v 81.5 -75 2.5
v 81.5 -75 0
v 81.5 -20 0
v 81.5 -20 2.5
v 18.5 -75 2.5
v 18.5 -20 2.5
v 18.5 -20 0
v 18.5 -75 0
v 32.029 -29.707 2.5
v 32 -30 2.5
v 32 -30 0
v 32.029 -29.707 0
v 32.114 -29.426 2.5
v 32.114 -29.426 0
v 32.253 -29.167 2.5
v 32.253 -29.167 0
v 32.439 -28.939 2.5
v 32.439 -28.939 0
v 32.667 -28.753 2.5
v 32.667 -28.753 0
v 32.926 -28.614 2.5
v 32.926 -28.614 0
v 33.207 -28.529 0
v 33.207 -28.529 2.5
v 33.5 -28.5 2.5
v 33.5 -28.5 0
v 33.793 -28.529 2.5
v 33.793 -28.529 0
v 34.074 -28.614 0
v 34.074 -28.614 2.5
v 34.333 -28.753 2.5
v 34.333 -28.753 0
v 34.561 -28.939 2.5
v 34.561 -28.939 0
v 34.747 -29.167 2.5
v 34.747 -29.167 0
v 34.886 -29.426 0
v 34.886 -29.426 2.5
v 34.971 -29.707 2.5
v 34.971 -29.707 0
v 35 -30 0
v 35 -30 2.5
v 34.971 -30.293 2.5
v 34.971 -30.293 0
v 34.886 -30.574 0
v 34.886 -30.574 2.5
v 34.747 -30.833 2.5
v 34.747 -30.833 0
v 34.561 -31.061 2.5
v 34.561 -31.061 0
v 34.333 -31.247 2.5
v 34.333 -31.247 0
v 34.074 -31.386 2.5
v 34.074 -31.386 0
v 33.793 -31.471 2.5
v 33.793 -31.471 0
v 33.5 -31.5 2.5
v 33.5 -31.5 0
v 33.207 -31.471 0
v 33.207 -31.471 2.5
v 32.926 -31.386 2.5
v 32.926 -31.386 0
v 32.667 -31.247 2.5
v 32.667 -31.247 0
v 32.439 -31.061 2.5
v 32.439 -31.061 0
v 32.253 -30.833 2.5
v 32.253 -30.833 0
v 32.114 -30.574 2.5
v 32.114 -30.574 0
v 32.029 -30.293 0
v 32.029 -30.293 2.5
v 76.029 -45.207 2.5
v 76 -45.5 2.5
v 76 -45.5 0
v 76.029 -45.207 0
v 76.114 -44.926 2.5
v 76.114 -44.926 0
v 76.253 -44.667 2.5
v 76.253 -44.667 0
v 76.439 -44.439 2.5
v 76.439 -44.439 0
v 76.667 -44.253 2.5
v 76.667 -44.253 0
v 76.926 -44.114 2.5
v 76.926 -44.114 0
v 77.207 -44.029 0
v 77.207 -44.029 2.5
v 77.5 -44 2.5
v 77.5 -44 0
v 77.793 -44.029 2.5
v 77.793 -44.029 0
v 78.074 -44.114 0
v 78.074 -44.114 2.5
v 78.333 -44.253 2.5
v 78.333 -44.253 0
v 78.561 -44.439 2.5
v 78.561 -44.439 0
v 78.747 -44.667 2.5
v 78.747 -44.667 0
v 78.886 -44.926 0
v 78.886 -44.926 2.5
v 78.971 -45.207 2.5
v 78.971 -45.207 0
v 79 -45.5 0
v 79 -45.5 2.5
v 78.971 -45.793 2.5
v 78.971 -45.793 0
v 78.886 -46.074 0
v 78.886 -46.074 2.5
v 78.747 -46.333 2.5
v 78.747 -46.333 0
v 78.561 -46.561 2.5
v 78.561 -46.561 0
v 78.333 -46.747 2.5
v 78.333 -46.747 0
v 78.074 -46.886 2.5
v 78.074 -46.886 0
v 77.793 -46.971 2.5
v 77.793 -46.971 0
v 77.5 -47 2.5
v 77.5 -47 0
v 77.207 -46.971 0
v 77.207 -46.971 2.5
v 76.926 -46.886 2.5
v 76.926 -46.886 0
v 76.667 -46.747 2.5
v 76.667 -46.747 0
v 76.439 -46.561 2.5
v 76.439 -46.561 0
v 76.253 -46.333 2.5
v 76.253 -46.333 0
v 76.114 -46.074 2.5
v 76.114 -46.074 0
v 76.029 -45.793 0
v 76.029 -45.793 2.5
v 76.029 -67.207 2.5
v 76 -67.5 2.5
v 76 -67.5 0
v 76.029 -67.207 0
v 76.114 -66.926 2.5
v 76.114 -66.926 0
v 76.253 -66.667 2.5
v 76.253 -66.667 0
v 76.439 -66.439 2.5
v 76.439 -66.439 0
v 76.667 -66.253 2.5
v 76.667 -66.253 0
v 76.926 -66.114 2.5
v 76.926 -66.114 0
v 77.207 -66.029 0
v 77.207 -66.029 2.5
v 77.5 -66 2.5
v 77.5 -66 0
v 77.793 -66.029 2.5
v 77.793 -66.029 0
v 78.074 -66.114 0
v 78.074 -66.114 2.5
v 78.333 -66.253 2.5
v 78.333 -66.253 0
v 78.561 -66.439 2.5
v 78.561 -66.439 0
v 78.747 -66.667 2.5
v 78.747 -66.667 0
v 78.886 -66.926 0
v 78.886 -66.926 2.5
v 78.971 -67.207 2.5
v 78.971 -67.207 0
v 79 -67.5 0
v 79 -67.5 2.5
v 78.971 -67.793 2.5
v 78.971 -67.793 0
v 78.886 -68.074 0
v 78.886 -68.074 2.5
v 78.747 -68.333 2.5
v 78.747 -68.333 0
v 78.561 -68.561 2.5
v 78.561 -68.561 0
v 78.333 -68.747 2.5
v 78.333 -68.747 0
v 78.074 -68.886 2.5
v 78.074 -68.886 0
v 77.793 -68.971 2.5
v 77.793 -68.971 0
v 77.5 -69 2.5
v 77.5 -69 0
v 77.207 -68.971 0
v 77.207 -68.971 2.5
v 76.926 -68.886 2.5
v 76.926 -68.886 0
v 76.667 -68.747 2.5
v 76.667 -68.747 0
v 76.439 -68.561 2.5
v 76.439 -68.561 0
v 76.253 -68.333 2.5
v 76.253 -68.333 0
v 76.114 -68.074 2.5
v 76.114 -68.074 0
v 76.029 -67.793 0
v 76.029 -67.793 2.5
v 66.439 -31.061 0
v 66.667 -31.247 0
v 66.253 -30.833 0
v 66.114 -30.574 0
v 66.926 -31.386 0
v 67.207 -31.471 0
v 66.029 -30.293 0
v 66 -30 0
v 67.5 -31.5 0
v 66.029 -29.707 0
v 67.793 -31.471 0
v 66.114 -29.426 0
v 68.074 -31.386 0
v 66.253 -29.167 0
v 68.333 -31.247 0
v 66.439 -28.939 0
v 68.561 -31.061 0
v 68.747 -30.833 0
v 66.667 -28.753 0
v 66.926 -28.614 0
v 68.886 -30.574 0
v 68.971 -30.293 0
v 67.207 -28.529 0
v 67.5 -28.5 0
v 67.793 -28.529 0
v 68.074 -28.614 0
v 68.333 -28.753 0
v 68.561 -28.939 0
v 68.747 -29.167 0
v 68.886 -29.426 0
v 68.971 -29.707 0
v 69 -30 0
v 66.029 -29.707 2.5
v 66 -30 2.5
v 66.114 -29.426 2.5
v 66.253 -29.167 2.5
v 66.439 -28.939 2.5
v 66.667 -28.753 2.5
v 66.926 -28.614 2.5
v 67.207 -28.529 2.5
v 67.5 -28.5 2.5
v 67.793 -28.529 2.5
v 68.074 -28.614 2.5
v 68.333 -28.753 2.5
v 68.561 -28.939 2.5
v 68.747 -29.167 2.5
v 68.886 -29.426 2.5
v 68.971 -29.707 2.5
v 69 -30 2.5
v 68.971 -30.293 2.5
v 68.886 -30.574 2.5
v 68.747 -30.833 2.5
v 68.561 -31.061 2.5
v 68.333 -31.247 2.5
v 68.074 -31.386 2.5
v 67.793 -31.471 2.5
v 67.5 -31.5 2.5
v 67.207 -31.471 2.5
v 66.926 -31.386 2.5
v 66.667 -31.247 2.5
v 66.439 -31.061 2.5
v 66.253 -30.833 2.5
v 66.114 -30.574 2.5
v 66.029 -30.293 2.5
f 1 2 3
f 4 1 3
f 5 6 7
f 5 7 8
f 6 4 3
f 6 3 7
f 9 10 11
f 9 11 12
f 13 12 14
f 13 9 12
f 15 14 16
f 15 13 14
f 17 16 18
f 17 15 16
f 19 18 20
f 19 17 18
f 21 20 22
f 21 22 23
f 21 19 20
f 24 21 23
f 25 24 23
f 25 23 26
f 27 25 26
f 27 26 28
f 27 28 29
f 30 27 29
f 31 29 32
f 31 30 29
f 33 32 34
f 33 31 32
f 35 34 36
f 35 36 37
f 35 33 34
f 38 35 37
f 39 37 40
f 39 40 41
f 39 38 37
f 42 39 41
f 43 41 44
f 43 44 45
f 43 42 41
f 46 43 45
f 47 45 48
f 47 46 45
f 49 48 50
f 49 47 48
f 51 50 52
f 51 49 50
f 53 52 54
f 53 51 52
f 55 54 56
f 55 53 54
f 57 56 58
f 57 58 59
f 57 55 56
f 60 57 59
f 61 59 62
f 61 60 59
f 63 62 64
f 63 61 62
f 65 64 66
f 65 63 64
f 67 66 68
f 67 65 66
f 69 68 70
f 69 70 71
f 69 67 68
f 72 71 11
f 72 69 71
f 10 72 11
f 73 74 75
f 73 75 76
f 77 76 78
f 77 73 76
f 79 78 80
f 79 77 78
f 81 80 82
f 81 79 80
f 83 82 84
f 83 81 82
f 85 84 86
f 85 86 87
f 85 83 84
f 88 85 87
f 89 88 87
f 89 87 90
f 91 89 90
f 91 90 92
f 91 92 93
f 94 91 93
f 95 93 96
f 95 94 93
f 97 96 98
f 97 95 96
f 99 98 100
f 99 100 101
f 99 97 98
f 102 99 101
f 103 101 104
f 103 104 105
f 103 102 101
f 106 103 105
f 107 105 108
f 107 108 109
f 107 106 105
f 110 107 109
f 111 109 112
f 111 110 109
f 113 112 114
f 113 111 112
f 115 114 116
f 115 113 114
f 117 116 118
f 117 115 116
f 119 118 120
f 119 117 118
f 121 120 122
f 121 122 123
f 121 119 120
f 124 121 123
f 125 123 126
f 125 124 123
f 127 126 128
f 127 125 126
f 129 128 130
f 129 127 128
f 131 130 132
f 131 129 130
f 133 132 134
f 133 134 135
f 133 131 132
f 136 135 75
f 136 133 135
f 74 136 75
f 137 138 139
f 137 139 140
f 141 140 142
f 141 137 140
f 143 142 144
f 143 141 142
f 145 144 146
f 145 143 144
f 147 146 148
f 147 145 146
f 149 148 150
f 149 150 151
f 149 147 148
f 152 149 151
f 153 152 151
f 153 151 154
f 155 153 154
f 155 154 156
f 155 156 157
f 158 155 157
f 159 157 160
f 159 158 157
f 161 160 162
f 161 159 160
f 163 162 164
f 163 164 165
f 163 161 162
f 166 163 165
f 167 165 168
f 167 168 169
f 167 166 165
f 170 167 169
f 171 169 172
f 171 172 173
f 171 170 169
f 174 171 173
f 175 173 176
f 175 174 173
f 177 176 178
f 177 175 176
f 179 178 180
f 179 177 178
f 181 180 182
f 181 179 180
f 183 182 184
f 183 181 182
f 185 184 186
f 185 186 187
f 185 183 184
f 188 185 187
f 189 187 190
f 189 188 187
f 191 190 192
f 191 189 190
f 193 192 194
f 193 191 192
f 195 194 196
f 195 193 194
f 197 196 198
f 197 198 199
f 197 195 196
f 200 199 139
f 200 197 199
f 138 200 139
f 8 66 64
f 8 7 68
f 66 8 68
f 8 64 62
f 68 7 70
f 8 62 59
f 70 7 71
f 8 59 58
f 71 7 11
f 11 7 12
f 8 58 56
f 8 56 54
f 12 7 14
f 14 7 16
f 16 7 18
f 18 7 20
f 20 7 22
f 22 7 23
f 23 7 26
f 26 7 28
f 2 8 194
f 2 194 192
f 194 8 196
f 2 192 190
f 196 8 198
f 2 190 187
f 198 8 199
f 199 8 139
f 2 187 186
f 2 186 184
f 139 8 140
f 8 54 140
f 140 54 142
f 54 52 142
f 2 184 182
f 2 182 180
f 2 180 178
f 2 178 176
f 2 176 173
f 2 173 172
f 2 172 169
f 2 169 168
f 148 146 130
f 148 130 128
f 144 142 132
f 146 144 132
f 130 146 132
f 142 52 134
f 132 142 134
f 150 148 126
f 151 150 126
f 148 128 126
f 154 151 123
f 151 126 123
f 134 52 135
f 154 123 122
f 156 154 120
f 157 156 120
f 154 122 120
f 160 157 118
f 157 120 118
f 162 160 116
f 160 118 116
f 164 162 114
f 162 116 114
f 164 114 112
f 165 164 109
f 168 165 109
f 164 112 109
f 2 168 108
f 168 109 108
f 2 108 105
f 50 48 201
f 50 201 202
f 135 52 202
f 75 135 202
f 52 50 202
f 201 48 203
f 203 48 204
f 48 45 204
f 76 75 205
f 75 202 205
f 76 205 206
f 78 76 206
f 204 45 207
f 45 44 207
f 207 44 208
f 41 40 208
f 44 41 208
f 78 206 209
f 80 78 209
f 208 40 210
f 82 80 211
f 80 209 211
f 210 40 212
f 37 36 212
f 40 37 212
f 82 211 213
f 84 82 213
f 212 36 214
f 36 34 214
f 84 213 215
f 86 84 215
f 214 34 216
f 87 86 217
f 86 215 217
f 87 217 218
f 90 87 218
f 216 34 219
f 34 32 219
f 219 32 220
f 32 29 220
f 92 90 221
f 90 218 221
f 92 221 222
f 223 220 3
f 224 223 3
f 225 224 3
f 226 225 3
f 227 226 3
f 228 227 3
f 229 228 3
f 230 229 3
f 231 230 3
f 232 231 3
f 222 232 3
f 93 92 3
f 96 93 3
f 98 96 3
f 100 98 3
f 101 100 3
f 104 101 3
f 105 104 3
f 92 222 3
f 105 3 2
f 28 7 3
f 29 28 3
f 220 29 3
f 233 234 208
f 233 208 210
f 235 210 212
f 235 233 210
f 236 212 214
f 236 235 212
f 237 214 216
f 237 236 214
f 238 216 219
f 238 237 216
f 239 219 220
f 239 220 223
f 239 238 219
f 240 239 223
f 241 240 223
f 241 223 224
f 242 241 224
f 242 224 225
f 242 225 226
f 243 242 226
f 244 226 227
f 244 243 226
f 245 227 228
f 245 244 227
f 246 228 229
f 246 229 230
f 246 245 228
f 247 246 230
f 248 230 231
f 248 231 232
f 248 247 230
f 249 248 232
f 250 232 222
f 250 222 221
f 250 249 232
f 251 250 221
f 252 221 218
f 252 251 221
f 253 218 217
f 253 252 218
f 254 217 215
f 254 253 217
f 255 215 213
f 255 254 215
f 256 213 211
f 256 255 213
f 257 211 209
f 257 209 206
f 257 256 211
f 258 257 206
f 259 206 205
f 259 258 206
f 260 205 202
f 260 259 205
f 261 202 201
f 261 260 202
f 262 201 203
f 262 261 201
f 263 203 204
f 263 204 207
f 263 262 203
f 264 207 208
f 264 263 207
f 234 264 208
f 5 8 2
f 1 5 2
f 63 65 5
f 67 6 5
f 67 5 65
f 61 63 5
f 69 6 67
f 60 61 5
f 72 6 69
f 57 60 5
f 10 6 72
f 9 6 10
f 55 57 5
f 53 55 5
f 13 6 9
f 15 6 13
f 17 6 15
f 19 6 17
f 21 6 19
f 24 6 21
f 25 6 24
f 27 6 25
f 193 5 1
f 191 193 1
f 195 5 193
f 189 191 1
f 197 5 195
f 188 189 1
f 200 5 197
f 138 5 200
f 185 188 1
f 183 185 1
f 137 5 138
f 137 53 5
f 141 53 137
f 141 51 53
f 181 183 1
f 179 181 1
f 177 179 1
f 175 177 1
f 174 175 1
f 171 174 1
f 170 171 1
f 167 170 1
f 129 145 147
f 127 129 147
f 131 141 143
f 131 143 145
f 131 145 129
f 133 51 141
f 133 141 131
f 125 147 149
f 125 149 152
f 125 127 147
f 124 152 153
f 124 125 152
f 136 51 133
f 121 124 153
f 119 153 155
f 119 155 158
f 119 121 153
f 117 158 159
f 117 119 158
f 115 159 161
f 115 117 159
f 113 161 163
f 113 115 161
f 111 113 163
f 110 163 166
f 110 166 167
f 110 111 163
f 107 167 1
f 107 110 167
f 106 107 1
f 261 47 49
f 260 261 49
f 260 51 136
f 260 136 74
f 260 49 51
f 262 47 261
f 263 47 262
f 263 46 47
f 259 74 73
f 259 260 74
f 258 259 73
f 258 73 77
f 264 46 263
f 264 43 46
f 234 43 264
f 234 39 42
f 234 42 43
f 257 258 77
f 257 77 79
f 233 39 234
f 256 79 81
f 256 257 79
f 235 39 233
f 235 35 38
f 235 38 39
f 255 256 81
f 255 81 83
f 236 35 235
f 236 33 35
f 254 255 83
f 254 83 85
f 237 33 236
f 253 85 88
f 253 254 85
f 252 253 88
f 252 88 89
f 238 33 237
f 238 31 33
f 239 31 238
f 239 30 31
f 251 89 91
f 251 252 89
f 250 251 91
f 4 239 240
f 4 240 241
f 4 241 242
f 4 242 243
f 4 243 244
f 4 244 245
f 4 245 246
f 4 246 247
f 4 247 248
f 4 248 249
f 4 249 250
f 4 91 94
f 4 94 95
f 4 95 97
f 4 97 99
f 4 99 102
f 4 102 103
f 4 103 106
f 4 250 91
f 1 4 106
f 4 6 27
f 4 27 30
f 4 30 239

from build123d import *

# Parameters (mm, degrees)
SKETCH1_W           = 163
SKETCH1_H           = 150
BOSS_EXTRUDE1_DEPTH = 2.5
SKETCH3_R           = 1.5
CUT_EXTRUDE1_DEPTH  = 2.5
SKETCH4_W           = 4
SKETCH4_H           = 22
CUT_EXTRUDE2_DEPTH  = 111.785829419
SKETCH5_R           = 1.1
CUT_EXTRUDE3_DEPTH  = 111.785829419
CUT_EXTRUDE4_START  = -10
SKETCH6_W           = 4
SKETCH6_H           = 22
SKETCH6_R           = 1.5
SKETCH6_R_2         = 1.1
CUT_EXTRUDE4_DEPTH  = 10


with BuildPart() as part:
    # Sketch1 → Boss-Extrude1 (new body)
    with BuildSketch(Plane.XY):
        Rectangle(SKETCH1_W, SKETCH1_H)
    extrude(amount=BOSS_EXTRUDE1_DEPTH)

    # Sketch3 → Cut-Extrude1 (cut)
    with BuildSketch(Plane.XY.offset(2.5)):
        with Locations((-67.5, -30)):
            Circle(SKETCH3_R)
        with Locations((-33.5, -30)):
            Circle(SKETCH3_R)
        with Locations((-77.5, -45.5)):
            Circle(SKETCH3_R)
        with Locations((-77.5, -67.5)):
            Circle(SKETCH3_R)
    cut_extrude1 = extrude(amount=-CUT_EXTRUDE1_DEPTH, mode=Mode.SUBTRACT)

    # Mirror1: Cut-Extrude1 across plane
    add(cut_extrude1.mirror(Plane(origin=(0, 0, 0), x_dir=(0, 0, 1), z_dir=(1, 0, 0))), mode=Mode.SUBTRACT)

    # Sketch4 → Cut-Extrude2 (cut, through all)
    with BuildSketch(Plane.XY.offset(2.5)):
        with Locations((32.5, -7.5)):
            Rectangle(SKETCH4_W, SKETCH4_H)
        with Locations((-32.5, 27.5)):
            Rectangle(SKETCH4_W, SKETCH4_H)
        with Locations((-32.5, -7.5)):
            Rectangle(SKETCH4_W, SKETCH4_H)
        with Locations((32.5, 27.5)):
            Rectangle(SKETCH4_W, SKETCH4_H)
    extrude(amount=-CUT_EXTRUDE2_DEPTH, mode=Mode.SUBTRACT)

    # Sketch5 → Cut-Extrude3 (cut, through all)
    with BuildSketch(Plane.XY.offset(2.5)):
        with Locations((-28, 70)):
            Circle(SKETCH5_R)
        with Locations((28, 70)):
            Circle(SKETCH5_R)
    extrude(amount=-CUT_EXTRUDE3_DEPTH, mode=Mode.SUBTRACT)

    # Sketch6 → Cut-Extrude4 (cut)
    with BuildSketch(Plane(origin=(0, 0, 0), x_dir=(-1, 0, 0), z_dir=(0, 0, -1)).offset(CUT_EXTRUDE4_START)):
        Polygon((-18.5, -20), (-18.5, -75), (81.5, -75), (81.5, 75), (-81.5, 75), (-81.5, -20), align=None)
        with Locations((-32.5, -7.5)):
            Rectangle(SKETCH6_W, SKETCH6_H, mode=Mode.SUBTRACT)
        with Locations((77.5, -67.5)):
            Circle(SKETCH6_R, mode=Mode.SUBTRACT)
        with Locations((77.5, -45.5)):
            Circle(SKETCH6_R, mode=Mode.SUBTRACT)
        with Locations((33.5, -30)):
            Circle(SKETCH6_R, mode=Mode.SUBTRACT)
        with Locations((32.5, -7.5)):
            Rectangle(SKETCH6_W, SKETCH6_H, mode=Mode.SUBTRACT)
        with Locations((67.5, -30)):
            Circle(SKETCH6_R, mode=Mode.SUBTRACT)
        with Locations((-32.5, 27.5)):
            Rectangle(SKETCH6_W, SKETCH6_H, mode=Mode.SUBTRACT)
        with Locations((-28, 70)):
            Circle(SKETCH6_R_2, mode=Mode.SUBTRACT)
        with Locations((32.5, 27.5)):
            Rectangle(SKETCH6_W, SKETCH6_H, mode=Mode.SUBTRACT)
        with Locations((28, 70)):
            Circle(SKETCH6_R_2, mode=Mode.SUBTRACT)
    extrude(amount=CUT_EXTRUDE4_DEPTH, mode=Mode.SUBTRACT)


solid = part.part
